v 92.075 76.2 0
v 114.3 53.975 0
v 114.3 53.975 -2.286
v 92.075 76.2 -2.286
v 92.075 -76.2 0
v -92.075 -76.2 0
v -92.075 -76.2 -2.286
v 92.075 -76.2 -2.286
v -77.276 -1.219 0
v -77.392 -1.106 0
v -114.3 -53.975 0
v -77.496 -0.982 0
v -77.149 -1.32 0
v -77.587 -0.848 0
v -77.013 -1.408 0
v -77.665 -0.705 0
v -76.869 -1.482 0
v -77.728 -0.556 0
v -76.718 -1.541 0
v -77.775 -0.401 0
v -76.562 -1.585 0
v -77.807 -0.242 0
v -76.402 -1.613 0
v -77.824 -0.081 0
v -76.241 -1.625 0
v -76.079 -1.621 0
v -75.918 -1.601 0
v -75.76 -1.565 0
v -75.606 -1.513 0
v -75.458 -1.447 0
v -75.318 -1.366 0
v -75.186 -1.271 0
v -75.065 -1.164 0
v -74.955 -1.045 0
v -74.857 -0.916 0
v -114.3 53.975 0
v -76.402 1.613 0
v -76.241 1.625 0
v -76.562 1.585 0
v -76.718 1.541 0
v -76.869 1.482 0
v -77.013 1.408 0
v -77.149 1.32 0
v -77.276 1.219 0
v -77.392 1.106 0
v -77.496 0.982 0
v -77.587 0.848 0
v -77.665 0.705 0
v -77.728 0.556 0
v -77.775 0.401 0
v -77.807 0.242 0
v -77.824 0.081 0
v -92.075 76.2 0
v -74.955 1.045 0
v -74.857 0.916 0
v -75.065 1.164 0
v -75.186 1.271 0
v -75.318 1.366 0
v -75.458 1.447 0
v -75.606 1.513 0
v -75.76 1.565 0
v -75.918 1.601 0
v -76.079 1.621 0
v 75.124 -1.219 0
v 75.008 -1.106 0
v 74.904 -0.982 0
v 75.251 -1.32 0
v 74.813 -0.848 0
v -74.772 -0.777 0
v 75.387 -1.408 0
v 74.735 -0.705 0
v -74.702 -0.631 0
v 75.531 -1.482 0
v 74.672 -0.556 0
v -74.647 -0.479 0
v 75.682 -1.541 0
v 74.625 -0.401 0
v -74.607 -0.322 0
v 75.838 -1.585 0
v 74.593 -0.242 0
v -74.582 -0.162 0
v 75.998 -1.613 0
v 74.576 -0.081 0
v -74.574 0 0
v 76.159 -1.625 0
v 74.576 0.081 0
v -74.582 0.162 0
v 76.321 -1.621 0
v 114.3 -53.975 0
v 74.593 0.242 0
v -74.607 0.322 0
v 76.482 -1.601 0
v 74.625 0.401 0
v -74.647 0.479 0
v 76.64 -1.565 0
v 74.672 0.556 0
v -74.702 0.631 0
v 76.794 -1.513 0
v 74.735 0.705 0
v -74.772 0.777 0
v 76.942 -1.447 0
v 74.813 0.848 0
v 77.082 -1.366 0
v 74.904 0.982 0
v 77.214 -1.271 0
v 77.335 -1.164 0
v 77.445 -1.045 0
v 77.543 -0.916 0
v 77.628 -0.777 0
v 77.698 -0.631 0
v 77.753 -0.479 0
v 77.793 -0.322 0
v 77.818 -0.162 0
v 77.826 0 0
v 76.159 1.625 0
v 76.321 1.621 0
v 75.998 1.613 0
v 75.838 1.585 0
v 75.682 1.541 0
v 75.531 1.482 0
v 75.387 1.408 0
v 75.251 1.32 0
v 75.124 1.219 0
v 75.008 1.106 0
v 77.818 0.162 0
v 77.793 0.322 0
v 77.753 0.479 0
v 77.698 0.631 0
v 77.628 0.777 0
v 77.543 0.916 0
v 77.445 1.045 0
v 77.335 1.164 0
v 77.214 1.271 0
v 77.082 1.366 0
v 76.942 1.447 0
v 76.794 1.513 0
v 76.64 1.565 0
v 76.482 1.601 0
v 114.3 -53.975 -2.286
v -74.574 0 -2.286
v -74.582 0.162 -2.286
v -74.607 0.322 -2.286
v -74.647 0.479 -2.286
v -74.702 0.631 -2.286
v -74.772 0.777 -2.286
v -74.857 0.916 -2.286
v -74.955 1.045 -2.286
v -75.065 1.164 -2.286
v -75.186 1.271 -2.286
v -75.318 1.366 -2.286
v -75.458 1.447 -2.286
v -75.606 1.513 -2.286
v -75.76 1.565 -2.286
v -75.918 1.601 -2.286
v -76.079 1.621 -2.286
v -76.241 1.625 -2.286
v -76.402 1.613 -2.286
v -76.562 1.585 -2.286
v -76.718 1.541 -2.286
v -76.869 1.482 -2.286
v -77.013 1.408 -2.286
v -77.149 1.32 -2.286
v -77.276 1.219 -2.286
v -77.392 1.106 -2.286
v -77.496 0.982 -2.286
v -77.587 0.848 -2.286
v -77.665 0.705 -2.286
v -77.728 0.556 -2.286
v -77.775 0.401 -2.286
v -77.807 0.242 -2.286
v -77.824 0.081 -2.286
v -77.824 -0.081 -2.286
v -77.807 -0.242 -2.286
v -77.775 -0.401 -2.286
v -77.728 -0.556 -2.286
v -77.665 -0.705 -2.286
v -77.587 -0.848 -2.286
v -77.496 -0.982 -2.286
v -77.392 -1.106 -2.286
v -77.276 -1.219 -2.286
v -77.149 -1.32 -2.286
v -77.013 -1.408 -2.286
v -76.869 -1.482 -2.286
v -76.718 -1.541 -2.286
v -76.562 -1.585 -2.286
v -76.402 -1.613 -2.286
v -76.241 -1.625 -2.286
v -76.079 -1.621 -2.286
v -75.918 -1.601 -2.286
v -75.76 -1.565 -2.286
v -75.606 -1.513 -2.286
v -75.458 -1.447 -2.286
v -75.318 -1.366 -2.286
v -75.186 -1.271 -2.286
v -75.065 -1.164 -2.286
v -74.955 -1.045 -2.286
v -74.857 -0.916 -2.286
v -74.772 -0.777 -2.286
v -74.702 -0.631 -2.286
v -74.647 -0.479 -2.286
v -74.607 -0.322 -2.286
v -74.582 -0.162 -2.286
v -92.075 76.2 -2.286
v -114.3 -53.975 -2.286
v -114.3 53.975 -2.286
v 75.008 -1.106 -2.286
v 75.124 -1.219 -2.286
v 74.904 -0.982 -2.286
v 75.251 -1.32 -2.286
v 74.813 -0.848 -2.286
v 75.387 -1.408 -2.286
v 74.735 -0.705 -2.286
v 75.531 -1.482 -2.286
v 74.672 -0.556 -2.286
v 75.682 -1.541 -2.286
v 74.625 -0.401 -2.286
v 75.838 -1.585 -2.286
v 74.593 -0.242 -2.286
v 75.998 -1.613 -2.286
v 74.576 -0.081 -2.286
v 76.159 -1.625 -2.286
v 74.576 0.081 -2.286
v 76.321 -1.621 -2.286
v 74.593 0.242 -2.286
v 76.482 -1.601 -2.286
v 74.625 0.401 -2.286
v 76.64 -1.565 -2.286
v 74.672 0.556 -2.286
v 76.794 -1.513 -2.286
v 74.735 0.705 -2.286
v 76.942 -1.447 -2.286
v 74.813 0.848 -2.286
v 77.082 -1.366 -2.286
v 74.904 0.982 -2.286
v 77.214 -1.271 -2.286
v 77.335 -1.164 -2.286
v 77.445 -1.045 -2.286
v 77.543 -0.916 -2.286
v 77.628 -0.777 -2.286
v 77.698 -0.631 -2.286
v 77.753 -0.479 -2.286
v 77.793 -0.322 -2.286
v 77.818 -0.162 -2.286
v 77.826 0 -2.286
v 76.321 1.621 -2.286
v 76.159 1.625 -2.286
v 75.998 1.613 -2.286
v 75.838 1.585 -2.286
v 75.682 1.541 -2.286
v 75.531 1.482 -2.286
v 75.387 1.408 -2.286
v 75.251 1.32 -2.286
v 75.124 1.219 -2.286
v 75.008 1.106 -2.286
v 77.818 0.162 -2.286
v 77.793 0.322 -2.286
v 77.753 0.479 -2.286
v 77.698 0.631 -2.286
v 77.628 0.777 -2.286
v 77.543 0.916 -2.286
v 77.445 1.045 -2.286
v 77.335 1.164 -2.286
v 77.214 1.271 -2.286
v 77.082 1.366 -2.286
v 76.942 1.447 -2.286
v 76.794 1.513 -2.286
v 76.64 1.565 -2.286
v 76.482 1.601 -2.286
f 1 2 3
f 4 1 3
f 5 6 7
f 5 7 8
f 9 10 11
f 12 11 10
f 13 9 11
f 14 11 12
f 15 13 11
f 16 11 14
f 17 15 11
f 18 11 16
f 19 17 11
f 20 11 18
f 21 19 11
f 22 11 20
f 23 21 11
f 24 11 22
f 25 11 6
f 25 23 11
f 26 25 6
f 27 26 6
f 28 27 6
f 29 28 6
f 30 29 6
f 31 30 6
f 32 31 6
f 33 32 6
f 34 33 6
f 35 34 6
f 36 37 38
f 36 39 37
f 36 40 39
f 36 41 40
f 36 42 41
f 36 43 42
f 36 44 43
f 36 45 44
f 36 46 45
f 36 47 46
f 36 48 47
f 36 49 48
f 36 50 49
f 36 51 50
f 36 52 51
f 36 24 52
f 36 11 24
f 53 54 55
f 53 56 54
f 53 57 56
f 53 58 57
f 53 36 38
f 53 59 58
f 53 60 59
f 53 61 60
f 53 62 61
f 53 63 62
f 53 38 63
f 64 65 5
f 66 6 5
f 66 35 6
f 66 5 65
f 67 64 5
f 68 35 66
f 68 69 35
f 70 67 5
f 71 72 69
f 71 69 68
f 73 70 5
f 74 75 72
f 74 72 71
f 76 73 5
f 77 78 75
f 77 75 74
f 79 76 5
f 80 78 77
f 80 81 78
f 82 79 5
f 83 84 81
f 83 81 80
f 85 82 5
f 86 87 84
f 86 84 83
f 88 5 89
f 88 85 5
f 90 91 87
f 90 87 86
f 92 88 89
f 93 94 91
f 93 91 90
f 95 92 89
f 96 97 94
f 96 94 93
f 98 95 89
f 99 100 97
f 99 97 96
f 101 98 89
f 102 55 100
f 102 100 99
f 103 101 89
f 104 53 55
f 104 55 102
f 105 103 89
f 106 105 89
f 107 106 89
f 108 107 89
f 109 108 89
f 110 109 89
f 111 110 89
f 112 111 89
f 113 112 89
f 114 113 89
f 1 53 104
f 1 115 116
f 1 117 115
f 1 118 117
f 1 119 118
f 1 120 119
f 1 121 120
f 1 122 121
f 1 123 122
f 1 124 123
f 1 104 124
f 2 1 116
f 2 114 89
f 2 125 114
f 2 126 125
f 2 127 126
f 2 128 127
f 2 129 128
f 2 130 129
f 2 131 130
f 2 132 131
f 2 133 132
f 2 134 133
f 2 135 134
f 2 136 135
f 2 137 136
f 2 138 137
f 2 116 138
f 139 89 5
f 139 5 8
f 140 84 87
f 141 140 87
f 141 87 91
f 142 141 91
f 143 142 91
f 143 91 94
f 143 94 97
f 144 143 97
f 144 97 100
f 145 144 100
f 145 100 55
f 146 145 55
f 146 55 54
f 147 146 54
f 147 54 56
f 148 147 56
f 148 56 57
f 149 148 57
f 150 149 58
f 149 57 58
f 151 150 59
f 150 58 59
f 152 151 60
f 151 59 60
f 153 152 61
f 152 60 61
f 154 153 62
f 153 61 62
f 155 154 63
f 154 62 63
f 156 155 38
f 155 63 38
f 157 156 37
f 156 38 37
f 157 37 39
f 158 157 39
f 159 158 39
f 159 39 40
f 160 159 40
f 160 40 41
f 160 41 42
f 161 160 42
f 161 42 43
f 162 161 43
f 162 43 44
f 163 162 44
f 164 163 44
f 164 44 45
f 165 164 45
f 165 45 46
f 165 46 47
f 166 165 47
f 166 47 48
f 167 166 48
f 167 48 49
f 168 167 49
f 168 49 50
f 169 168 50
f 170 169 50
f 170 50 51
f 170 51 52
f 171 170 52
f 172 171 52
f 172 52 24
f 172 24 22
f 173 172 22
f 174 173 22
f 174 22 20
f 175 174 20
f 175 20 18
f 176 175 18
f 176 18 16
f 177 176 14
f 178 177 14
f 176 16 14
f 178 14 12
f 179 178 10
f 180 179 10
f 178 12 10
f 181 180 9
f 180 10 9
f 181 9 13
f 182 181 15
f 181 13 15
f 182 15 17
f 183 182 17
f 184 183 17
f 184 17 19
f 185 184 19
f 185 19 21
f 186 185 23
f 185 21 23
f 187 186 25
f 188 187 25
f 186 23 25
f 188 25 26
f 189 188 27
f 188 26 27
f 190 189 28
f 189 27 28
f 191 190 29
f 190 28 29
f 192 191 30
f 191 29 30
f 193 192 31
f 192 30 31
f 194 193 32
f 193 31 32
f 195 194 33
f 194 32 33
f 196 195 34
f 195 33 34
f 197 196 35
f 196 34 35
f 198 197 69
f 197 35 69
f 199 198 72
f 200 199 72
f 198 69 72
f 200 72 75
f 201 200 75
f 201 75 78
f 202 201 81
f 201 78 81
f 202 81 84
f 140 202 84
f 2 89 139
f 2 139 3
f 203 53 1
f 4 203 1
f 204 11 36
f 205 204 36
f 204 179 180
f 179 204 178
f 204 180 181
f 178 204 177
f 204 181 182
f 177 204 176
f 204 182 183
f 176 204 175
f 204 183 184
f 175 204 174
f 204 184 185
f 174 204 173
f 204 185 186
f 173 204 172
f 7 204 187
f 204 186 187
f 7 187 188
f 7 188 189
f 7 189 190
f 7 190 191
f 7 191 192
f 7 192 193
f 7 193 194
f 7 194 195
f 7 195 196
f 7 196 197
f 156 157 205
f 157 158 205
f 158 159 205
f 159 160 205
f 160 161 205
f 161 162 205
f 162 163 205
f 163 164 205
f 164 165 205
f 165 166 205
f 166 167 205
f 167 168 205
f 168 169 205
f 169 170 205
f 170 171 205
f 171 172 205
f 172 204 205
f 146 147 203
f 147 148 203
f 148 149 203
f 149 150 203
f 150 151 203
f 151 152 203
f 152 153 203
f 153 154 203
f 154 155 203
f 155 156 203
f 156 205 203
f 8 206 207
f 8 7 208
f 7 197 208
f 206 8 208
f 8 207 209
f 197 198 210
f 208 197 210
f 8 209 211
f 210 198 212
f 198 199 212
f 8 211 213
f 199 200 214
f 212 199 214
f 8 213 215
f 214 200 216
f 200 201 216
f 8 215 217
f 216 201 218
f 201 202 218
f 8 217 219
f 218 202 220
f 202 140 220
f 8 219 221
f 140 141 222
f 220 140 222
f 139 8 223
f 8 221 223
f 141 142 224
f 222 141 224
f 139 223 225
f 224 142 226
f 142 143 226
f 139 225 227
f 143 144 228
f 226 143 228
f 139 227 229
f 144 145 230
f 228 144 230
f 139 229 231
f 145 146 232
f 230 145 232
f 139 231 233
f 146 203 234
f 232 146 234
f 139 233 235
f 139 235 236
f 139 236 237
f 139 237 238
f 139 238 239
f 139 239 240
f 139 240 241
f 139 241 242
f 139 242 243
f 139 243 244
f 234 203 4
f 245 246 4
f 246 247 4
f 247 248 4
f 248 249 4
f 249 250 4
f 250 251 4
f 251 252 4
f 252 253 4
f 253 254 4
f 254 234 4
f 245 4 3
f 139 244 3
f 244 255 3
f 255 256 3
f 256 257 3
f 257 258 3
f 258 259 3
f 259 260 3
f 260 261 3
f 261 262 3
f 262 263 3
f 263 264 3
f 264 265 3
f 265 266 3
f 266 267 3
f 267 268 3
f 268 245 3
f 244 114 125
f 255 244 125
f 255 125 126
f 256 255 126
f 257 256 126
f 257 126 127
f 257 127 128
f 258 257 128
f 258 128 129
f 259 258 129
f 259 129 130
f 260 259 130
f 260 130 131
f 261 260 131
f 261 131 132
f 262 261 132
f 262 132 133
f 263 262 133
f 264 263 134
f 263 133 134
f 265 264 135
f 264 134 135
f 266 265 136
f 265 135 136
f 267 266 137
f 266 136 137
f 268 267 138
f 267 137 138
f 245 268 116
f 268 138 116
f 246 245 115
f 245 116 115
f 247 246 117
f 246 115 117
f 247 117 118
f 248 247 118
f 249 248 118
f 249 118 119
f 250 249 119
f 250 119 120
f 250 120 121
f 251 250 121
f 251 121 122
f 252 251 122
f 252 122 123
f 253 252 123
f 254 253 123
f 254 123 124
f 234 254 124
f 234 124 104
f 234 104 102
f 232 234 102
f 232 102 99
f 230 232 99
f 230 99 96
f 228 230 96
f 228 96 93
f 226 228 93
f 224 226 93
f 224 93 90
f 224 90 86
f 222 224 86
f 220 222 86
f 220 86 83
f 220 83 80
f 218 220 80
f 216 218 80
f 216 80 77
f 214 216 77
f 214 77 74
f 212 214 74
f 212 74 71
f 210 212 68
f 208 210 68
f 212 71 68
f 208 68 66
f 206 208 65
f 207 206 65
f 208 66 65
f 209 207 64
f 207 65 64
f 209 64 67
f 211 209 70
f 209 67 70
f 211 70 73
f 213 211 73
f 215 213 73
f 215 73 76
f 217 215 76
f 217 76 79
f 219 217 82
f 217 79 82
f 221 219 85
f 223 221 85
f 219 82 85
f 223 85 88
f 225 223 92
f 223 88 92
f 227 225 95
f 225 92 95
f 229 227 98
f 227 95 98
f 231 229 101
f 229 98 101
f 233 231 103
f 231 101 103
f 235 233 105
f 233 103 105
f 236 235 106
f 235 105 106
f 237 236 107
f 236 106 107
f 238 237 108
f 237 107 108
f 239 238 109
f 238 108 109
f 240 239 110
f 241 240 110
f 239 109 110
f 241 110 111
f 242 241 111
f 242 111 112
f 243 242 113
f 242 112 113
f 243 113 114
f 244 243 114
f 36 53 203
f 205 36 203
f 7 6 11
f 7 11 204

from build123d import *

# Parameters (mm, degrees)
F0_W     = 228.6
F0_H     = 152.4
F1_DEPTH = 2.286
F2_R     = 1.6256
F3_DEPTH = 2.287
F4_SIZE  = 22.225


with BuildPart() as f1:
    # F0 (on Top) → F1 (new body)
    with BuildSketch(Plane.XY):
        Rectangle(F0_W, F0_H)
    extrude(amount=-F1_DEPTH)

    # F2 (on face) → F3 (cut, through all)
    with BuildSketch(Plane.XY):
        with Locations((-76.2, 0)):
            Circle(F2_R)
        with Locations((76.2, 0)):
            Circle(F2_R)
    extrude(amount=-F3_DEPTH, mode=Mode.SUBTRACT)

    # F4
    f4_edges = [f1.edges().sort_by_distance(p)[0] for p in [
        (-114.3, 76.2, -1.143),
        (114.3, 76.2, -1.143),
        (-114.3, -76.2, -1.143),
        (114.3, -76.2, -1.143),
    ]]
    chamfer(f4_edges, length=F4_SIZE)


solid = f1.part
